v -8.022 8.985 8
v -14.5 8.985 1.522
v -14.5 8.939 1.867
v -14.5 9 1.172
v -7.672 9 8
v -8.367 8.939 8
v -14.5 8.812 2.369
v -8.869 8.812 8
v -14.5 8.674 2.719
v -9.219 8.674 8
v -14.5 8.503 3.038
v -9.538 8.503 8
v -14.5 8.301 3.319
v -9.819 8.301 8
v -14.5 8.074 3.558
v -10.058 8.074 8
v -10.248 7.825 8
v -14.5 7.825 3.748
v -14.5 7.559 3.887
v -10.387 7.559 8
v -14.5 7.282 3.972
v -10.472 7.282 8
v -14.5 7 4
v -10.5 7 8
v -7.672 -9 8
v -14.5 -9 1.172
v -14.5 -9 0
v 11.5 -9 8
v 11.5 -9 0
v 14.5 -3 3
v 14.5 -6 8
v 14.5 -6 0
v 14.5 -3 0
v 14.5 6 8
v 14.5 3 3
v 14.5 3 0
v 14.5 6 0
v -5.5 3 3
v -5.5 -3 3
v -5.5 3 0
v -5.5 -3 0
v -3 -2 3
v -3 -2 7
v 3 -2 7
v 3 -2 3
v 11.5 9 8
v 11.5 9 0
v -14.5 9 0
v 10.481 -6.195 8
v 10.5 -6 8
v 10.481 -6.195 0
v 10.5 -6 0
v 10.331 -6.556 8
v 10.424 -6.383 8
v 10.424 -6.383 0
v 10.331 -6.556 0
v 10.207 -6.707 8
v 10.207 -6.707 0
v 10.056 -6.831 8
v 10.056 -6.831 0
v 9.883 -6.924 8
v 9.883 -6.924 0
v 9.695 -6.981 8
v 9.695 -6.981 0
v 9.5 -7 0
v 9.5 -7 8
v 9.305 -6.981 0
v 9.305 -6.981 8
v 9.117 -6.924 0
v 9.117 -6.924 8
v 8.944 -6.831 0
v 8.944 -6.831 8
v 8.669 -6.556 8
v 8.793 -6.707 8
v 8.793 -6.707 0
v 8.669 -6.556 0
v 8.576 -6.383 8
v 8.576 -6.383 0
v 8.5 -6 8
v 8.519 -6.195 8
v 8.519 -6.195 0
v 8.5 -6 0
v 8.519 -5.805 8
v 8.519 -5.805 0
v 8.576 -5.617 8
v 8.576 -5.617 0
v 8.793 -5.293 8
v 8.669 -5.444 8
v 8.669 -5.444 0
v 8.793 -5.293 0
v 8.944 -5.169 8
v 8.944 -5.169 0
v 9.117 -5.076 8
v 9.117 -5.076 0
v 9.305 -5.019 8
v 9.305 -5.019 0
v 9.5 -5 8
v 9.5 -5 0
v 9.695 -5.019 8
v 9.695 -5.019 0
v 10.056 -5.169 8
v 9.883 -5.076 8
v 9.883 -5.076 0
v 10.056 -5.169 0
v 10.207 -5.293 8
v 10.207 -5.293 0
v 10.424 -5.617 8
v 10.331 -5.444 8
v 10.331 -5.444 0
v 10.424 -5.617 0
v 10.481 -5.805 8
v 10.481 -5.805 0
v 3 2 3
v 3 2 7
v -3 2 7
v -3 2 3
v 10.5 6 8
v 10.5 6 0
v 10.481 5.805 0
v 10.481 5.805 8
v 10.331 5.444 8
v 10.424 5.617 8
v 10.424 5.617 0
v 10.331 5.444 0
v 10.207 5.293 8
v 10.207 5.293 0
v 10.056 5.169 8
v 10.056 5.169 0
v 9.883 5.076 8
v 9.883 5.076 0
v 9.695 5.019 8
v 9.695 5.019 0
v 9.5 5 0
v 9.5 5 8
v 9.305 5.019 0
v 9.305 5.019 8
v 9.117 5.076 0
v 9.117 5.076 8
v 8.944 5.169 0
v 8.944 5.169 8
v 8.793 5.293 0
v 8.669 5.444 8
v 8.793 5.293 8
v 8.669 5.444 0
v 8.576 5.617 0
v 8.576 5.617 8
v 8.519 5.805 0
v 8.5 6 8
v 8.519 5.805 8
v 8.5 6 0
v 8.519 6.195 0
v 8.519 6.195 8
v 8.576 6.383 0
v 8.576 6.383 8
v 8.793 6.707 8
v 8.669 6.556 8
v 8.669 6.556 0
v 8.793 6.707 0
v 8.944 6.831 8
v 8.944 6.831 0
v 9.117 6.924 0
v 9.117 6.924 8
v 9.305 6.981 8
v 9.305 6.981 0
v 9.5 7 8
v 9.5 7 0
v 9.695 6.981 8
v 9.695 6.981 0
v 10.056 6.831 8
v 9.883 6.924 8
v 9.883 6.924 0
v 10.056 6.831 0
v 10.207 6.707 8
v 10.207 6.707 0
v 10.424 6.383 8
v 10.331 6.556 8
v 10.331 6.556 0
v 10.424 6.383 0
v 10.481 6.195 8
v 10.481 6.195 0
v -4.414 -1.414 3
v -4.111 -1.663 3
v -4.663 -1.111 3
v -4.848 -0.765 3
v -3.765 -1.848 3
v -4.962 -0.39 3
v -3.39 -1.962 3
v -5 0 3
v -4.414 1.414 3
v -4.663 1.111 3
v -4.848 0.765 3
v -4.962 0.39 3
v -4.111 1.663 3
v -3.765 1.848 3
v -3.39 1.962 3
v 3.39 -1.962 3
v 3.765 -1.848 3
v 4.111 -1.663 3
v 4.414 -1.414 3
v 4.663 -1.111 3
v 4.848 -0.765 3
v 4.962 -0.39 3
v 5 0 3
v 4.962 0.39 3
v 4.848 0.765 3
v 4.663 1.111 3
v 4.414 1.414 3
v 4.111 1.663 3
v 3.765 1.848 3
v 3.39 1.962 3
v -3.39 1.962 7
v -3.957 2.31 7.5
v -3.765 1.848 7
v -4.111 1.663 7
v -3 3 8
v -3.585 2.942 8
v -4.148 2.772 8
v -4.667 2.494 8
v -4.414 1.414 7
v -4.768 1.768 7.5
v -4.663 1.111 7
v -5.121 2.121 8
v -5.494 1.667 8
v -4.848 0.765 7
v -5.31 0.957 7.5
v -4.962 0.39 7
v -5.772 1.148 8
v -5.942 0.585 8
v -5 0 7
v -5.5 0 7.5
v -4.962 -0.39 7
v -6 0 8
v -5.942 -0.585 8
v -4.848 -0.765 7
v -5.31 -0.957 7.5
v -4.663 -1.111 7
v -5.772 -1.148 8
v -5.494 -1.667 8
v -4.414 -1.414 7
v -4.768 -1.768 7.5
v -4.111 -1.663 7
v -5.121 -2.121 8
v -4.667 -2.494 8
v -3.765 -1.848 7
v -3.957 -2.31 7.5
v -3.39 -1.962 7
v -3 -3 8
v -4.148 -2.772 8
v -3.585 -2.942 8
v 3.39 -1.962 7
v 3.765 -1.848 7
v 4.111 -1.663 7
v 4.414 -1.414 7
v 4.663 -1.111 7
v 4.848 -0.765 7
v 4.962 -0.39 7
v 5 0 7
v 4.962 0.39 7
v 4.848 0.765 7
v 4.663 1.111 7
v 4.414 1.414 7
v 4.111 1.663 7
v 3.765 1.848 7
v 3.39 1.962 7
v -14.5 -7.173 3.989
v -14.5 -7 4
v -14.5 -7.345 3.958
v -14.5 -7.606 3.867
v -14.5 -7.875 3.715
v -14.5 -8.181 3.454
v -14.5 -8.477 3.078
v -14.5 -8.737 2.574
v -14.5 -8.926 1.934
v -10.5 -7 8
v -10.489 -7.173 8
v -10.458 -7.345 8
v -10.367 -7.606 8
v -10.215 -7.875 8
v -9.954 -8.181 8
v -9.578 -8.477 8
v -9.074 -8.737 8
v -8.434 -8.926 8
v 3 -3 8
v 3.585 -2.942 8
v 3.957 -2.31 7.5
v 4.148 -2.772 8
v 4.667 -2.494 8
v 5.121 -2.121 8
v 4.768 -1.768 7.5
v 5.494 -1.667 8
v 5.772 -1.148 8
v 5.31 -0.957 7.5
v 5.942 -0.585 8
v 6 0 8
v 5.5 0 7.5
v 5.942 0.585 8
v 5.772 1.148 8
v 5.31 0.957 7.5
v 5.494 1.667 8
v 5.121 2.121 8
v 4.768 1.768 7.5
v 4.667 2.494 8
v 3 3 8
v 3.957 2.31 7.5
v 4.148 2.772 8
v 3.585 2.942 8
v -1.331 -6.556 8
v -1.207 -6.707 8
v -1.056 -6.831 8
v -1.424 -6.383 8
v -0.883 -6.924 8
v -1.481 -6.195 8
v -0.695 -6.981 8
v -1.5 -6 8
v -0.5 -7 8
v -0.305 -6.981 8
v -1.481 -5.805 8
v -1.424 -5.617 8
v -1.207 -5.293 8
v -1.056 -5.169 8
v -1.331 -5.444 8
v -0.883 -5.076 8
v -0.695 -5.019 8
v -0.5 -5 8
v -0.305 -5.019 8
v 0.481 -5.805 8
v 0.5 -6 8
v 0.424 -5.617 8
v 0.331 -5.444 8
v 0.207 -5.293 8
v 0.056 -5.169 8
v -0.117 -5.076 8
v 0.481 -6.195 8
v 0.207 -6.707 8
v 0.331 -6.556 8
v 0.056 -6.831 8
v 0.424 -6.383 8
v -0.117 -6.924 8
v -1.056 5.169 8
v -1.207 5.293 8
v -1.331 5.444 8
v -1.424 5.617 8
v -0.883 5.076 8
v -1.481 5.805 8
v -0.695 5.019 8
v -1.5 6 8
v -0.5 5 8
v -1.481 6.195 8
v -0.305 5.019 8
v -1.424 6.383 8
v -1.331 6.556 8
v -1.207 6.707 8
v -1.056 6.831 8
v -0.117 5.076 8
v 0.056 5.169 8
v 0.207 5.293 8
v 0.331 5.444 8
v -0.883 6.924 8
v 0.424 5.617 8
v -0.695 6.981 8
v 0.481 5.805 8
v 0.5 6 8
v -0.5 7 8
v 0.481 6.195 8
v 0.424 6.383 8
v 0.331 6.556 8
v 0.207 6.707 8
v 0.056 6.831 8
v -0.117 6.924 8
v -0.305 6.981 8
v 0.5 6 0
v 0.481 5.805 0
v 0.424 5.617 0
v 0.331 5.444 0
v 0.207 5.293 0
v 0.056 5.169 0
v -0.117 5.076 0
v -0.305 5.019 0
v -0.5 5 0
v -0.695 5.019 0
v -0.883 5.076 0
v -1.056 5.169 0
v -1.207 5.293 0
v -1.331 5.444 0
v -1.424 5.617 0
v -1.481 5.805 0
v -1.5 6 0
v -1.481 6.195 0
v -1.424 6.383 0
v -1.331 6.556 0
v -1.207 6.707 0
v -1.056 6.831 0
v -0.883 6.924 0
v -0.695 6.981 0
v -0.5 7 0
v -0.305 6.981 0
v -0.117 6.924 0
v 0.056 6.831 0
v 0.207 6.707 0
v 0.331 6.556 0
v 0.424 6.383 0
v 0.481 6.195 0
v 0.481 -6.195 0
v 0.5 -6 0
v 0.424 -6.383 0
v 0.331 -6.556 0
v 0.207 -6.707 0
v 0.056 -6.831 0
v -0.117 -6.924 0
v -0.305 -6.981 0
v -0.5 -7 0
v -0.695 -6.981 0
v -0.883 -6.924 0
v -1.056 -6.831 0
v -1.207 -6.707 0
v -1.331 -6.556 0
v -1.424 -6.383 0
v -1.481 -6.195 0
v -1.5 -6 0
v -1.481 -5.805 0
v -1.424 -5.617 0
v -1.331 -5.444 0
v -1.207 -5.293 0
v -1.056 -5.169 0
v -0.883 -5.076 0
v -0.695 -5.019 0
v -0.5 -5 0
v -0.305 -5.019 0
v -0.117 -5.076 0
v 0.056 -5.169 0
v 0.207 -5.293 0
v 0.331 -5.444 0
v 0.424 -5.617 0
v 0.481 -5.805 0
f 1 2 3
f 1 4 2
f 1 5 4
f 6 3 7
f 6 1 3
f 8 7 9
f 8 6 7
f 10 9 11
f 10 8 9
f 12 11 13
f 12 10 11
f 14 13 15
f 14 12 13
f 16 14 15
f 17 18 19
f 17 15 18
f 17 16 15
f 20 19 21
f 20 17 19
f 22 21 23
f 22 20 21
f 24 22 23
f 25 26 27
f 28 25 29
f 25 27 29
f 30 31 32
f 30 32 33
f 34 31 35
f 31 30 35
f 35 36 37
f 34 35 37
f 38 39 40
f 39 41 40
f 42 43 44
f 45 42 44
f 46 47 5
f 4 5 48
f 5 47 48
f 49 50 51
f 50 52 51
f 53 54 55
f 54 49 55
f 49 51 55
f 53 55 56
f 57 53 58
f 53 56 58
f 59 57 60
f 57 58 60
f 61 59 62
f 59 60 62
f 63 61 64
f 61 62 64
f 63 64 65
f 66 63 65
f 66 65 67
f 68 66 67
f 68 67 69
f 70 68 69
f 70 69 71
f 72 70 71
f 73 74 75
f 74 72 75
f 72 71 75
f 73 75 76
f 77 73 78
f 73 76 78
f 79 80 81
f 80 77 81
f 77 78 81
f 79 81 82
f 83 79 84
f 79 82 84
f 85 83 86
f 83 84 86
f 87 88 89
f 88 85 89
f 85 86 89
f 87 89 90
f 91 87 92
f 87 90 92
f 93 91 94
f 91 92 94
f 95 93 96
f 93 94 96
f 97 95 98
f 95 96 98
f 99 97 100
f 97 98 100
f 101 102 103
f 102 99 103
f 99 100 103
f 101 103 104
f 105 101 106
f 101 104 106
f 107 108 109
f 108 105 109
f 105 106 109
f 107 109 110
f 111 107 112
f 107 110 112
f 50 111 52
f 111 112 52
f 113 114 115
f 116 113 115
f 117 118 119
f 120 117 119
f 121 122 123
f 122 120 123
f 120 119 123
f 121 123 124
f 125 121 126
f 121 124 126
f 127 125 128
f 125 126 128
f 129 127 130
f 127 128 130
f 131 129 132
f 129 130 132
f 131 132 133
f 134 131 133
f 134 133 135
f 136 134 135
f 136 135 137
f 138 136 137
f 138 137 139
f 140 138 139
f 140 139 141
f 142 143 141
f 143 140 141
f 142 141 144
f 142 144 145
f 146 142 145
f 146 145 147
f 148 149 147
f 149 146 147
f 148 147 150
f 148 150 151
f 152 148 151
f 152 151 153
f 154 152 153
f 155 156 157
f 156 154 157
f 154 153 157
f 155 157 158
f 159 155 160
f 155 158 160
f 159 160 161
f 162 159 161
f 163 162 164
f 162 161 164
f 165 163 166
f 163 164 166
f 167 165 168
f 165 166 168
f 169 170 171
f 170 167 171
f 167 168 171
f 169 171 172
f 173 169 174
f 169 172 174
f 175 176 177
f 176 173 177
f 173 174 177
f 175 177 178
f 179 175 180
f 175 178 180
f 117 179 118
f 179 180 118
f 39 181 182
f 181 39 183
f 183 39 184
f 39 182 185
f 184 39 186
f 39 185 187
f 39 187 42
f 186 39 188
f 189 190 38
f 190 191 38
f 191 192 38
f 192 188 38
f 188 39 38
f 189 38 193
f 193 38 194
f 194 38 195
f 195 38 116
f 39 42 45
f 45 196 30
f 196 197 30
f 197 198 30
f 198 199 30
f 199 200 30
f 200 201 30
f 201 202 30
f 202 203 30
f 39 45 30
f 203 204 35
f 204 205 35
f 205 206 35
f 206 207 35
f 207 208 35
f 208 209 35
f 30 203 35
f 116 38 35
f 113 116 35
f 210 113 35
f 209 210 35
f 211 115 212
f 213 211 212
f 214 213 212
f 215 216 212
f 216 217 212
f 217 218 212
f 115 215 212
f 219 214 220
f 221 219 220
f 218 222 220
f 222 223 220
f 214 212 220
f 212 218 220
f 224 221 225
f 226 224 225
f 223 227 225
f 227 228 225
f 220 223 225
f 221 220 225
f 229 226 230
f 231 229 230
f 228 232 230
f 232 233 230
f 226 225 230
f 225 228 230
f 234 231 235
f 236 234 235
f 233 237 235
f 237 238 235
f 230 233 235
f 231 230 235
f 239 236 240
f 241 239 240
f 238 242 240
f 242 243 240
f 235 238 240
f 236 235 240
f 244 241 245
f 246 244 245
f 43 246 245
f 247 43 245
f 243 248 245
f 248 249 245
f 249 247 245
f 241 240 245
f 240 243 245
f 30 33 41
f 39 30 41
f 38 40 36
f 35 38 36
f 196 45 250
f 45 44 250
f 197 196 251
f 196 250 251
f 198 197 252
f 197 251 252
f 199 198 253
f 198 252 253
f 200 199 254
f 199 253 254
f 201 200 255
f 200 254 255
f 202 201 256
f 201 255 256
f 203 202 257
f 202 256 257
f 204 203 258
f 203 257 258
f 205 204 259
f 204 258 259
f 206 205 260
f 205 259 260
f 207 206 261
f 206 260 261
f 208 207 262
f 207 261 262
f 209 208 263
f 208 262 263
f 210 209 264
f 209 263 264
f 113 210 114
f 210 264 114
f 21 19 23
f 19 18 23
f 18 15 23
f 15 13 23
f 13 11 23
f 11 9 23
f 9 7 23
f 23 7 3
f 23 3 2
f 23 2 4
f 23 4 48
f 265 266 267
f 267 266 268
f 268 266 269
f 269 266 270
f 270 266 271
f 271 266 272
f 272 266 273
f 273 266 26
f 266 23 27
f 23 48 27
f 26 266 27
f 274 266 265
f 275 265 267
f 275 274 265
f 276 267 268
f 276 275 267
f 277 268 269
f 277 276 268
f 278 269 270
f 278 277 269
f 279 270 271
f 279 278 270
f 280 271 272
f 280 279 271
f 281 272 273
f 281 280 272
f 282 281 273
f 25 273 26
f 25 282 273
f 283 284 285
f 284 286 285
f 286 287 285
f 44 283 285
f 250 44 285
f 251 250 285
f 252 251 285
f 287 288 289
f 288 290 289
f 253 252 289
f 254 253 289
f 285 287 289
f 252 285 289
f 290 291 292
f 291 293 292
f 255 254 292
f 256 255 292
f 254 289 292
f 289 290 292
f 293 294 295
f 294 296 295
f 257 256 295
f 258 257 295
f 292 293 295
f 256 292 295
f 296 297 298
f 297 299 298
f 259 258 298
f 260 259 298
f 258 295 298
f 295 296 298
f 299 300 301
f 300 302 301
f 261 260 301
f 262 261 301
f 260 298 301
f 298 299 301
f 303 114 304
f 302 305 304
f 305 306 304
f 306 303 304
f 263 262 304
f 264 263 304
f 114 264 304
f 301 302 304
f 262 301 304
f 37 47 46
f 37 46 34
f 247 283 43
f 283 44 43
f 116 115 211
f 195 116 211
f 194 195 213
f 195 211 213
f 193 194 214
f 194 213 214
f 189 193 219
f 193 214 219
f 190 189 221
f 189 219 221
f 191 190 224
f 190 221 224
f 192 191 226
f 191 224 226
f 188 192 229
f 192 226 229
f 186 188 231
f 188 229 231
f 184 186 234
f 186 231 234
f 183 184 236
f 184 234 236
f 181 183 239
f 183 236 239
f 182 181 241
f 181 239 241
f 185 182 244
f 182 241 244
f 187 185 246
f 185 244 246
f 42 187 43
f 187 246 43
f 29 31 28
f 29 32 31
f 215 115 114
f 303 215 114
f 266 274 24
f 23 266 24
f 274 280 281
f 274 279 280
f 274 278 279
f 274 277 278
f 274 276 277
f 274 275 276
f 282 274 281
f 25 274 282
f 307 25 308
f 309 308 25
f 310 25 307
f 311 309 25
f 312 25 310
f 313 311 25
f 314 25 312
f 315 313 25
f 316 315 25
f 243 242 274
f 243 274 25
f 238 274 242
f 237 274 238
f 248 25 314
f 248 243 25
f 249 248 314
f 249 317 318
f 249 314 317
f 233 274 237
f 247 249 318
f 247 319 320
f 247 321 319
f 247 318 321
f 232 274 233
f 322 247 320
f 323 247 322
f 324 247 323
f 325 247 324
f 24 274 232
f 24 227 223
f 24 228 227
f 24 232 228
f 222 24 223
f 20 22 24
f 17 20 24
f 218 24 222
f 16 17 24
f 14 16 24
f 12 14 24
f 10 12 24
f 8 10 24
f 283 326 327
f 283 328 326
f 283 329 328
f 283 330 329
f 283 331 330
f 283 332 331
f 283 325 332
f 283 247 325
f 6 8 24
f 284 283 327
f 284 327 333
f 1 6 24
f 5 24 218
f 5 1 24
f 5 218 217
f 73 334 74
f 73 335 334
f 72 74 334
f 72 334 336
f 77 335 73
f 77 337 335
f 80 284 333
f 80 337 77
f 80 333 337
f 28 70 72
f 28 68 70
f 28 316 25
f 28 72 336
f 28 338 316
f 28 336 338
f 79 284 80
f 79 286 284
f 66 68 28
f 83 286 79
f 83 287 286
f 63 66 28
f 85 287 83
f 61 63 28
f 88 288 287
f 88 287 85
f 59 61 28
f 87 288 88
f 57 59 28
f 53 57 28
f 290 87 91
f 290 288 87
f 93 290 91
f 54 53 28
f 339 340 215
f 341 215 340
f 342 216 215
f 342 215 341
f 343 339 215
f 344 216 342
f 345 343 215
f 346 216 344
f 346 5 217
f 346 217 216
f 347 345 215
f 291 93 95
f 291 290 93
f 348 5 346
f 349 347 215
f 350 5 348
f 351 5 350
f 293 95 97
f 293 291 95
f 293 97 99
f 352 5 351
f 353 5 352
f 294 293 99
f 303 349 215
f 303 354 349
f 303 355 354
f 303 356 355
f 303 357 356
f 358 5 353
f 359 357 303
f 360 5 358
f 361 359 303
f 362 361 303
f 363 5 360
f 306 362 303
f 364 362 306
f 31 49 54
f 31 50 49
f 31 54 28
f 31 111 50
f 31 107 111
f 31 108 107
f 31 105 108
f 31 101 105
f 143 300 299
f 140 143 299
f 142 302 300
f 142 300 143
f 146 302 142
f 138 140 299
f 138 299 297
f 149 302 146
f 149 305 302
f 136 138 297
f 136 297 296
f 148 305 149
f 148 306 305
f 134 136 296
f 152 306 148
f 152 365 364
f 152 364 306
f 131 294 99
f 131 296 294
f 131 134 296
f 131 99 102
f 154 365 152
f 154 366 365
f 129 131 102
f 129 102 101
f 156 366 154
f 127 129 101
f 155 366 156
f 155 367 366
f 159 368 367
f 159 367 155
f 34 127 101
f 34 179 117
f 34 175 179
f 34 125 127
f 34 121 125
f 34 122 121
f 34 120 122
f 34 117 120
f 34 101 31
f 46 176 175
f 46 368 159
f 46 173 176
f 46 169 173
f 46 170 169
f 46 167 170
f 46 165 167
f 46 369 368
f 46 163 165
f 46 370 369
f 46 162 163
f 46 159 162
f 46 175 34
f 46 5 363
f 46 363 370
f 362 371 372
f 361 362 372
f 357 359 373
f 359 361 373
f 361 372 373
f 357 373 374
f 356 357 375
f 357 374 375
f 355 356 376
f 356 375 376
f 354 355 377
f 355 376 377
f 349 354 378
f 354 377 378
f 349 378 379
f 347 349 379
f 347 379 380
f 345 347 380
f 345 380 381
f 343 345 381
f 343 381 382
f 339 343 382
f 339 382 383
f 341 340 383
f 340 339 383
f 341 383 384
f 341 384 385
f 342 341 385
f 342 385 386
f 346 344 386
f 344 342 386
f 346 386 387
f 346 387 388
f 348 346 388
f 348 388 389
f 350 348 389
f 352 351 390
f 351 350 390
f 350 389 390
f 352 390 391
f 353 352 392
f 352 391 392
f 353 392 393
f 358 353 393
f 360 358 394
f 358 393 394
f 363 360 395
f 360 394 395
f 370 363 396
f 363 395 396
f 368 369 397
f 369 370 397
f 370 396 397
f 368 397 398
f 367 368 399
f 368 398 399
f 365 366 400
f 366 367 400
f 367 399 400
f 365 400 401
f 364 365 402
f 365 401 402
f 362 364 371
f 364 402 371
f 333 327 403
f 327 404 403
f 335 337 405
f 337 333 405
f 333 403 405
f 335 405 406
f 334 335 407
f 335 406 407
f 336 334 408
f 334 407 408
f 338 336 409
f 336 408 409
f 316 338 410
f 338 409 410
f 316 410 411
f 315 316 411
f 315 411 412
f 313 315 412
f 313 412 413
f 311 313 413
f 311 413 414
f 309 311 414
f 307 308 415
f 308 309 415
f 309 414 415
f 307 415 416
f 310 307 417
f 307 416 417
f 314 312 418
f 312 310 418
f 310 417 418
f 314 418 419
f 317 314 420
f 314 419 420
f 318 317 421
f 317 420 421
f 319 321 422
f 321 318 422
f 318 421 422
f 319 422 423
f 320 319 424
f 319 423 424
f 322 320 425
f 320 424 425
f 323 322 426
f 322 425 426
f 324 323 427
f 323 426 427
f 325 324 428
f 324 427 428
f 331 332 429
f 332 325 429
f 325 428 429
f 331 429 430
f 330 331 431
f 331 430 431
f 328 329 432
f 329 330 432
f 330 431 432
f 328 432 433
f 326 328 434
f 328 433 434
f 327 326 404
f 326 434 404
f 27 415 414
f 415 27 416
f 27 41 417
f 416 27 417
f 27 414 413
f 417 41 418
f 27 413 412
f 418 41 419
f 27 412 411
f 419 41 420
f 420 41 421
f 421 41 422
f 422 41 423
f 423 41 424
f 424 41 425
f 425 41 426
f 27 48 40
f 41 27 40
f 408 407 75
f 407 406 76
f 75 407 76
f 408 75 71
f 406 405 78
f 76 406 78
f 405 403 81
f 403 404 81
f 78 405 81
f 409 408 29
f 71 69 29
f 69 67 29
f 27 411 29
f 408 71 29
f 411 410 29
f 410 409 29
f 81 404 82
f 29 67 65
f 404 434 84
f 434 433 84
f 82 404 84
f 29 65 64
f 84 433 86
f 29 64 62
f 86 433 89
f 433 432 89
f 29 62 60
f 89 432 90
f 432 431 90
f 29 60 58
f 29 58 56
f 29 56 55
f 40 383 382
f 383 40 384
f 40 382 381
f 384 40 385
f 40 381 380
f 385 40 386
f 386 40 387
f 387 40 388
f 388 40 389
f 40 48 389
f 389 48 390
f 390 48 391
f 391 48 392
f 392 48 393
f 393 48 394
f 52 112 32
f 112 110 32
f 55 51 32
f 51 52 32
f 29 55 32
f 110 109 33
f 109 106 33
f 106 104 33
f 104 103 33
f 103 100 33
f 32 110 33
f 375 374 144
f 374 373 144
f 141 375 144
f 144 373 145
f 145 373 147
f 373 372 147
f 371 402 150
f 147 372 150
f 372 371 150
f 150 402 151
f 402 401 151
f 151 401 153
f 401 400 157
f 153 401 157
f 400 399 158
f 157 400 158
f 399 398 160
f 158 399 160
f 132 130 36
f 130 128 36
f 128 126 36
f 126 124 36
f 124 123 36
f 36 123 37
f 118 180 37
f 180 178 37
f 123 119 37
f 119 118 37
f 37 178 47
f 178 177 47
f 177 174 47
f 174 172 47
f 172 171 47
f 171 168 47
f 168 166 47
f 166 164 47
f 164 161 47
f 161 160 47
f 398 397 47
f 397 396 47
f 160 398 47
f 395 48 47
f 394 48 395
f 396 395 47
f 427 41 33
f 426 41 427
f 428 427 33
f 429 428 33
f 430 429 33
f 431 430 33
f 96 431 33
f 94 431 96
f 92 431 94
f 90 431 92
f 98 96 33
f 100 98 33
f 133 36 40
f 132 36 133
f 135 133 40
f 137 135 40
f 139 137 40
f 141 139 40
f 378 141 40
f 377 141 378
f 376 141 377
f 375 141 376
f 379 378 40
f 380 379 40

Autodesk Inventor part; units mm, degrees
ref_plane "YZ Plane" through (0, 0, 0) normal (1, 0, 0) x (0, 1, 0)
ref_plane "XZ Plane" through (0, 0, 0) normal (0, 1, 0) x (-1, 0, 0)
ref_plane "XY Plane" through (0, 0, 0) normal (0, 0, 1) x (1, 0, 0)
sketch "Sketch1" plane through (0, 0, 0) normal (0, 0, 1) x (1, 0, 0)
  line L0 (14.5, -3) -> (-5.5, -3) projected
  line L1 (-5.5, -3) -> (-5.5, 3) projected
  line L2 (-5.5, 3) -> (14.5, 3) projected
  line L3 (14.5, 3) -> (14.5, 6) projected
  line L4 (11.5, 9) -> (-14.5, 9) projected
  line L5 (-14.5, 9) -> (-14.5, 0) projected
  line L6 (-14.5, 0) -> (-14.5, -9) projected
  line L7 (-14.5, -9) -> (11.5, -9) projected
  line L8 (14.5, -6) -> (14.5, -3) projected
  circle A0 centre (-0.5, 6) radius 1 projected
  circle A1 centre (9.5, 6) radius 1 projected
  circle A2 centre (-0.5, -6) radius 1 projected
  circle A3 centre (9.5, -6) radius 1 projected
  line L9 (14.5, -6) -> (11.5, -9) projected
  line L10 (11.5, 9) -> (14.5, 6) projected
  point P0 (0, 0)
extrude "Extrusion1" add sketch "Sketch1" along normal blind 3
sketch "Sketch2" plane through (0, 0, 3) normal (0, 0, 1) x (1, 0, 0)
  line L0 (-5.5, -3) -> (-5.5, 3) projected
  line L1 (-5.5, 3) -> (14.5, 3) projected
  line L2 (14.5, 3) -> (14.5, 6) projected
  line L3 (11.5, 9) -> (-14.5, 9) projected
  line L4 (-14.5, 9) -> (-14.5, -9) projected
  line L5 (-14.5, -9) -> (11.5, -9) projected
  line L6 (14.5, -6) -> (14.5, -3) projected
  line L7 (14.5, -3) -> (-5.5, -3) projected
  circle A0 centre (-0.5, 6) radius 1 projected
  circle A1 centre (9.5, 6) radius 1 projected
  circle A2 centre (-0.5, -6) radius 1 projected
  circle A3 centre (9.5, -6) radius 1 projected
  line L8 (14.5, 3) -> (14.5, 9) projected
  line L9 (14.5, -3) -> (14.5, 3)
  line L10 (11.5, -9) -> (14.5, -6) projected
  line L11 (14.5, 6) -> (11.5, 9) projected
  point P0 (0, 0)
extrude "Extrusion2" add sketch "Sketch2" along normal blind 5
chamfer "Chamfer1" distance 4 angle 45 1 edges at (-14.5, 0, 8)
fillet "Fillet1" radius 2 2 edges at (-12.5, 9, 6) (-12.5, -9, 6)
sketch "Sketch3" plane through (0, 0, 8) normal (0, 0, 1) x (1, 0, 0)
  line L0 (11.5, 9) -> (-7.6716, 9) projected
  ellipse E0 centre (-7.6716, 7) end of major axis (-10.5, 7) minor radius 2 (-7.6716, 9) -> (-10.5, 7) ccw projected
  line L1 (-10.5, -7) -> (-10.5, 7) projected
  ellipse E1 centre (-7.6716, -7) end of major axis (-10.5, -7) minor radius 2 (-10.5, -7) -> (-7.6716, -9) ccw projected
  line L2 (-7.6716, -9) -> (11.5, -9) projected
  line L3 (14.5, -6) -> (14.5, 6) projected
  circle A0 centre (-0.5, 6) radius 1 projected
  circle A1 centre (9.5, 6) radius 1 projected
  circle A2 centre (-0.5, -6) radius 1 projected
  circle A3 centre (9.5, -6) radius 1 projected
  line L4 (-3, 0) -> (3, 0) construction
  line L5 (-3, -2) -> (3, -2)
  line L6 (3, 2) -> (-3, 2)
  arc A4 (-3, 2) -> (-3, -2) centre (-3, 0) ccw
  arc A5 (3, -2) -> (3, 2) centre (3, 0) ccw
  line L7 (11.5, -9) -> (14.5, -6) projected
  line L8 (14.5, 6) -> (11.5, 9) projected
  point P0 (0, 0)
  dimension "d12" = 3
  dimension "d13" = 4
extrude "Extrusion3" cut sketch "Sketch3" against normal blind 5 contours A4 L6 A5 L5
chamfer "Chamfer3" distance 1 angle 45 4 edges at (5, 0, 8) (0, -2, 8) (-5, 0, 8) (0, 2, 8)
properties part number "end_tip_2"
